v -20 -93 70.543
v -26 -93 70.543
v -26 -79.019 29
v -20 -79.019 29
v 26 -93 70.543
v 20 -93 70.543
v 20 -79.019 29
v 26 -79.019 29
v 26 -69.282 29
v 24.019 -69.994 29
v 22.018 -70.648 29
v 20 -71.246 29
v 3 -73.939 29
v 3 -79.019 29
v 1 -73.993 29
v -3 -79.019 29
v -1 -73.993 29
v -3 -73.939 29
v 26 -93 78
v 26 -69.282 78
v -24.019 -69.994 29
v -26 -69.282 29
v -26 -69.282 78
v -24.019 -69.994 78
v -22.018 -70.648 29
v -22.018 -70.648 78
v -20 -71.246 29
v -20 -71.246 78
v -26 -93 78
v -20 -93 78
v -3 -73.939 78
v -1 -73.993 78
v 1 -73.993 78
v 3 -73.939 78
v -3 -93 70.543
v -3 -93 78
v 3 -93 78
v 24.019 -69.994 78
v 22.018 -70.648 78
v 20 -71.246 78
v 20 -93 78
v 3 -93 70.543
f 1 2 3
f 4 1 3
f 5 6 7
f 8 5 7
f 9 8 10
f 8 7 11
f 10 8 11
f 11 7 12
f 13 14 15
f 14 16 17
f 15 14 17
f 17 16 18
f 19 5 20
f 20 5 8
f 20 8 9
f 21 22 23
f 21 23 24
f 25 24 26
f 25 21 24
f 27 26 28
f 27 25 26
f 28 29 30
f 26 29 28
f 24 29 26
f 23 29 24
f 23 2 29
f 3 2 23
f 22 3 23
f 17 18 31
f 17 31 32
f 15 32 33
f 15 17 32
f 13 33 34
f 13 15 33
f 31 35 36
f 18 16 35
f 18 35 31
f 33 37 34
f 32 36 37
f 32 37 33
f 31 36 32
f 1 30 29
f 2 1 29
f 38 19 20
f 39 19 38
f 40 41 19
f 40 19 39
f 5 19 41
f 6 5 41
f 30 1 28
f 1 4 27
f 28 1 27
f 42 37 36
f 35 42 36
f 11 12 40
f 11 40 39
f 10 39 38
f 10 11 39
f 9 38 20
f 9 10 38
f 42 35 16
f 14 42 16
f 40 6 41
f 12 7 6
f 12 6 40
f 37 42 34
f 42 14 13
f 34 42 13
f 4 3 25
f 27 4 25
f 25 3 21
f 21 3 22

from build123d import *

# Parameters (mm, degrees)
CYLINDER1827_R         = 74
CYLINDER1827_DEPTH     = 64
BOX790_W               = 80
BOX790_H               = 6
BOX790_DEPTH           = 20
BOX790_PLACEMENT_ANGLE = 71.4
BOX792_W               = 44
BOX792_H               = 6
BOX792_DEPTH           = 49
CUT588_PLACEMENT_ANGLE = 90
BOX795_W               = 80
BOX795_H               = 6
BOX795_DEPTH           = 20
BOX795_PLACEMENT_ANGLE = 71.4
BOX796_W               = 44
BOX796_H               = 6
BOX796_DEPTH           = 49
CUT590_PLACEMENT_ANGLE = 90
BOX789_W               = 80
BOX789_H               = 6
BOX789_DEPTH           = 20
BOX789_PLACEMENT_ANGLE = 71.4
BOX787_W               = 44
BOX787_H               = 6
BOX787_DEPTH           = 49
CUT587_PLACEMENT_ANGLE = 90


with BuildPart() as v_lec1827:
    # Cylinder1827 → Cylinder1827 (new body)
    with BuildSketch(Plane.XY.offset(25)):
        Circle(CYLINDER1827_R)
    extrude(amount=CYLINDER1827_DEPTH)


with BuildPart() as krychle790:
    # Box790 → Box790 (new body)
    with BuildSketch(Plane.XY):
        with Locations((40, 3)):
            Rectangle(BOX790_W, BOX790_H)
    extrude(amount=BOX790_DEPTH)


with BuildPart() as krychle790_1:
    # Box790 placement: moved
    add(krychle790.part.moved(Location((-118.17, -24, 82.63))).rotate(Axis((-118.17, -24, 82.63), (0, 1, 0)), BOX790_PLACEMENT_ANGLE))


with BuildPart() as cut588:
    # Box792 → Box792 (new body)
    with BuildSketch(Plane(origin=(-93, -24, 29), x_dir=(1, 0, 0), z_dir=(0, 0, 1))):
        with Locations((22, 3)):
            Rectangle(BOX792_W, BOX792_H)
    extrude(amount=BOX792_DEPTH)

    # Cut588: cut Krychle790
    add(krychle790_1.part, mode=Mode.SUBTRACT)


with BuildPart() as cut588_1:
    # Cut588 placement: moved
    add(cut588.part.moved(Location((-44, 0, 0))).rotate(Axis((-44, 0, 0), (0, 0, 1)), CUT588_PLACEMENT_ANGLE))


with BuildPart() as krychle795:
    # Box795 → Box795 (new body)
    with BuildSketch(Plane.XY):
        with Locations((40, 3)):
            Rectangle(BOX795_W, BOX795_H)
    extrude(amount=BOX795_DEPTH)


with BuildPart() as krychle795_1:
    # Box795 placement: moved
    add(krychle795.part.moved(Location((-118.17, -24, 82.63))).rotate(Axis((-118.17, -24, 82.63), (0, 1, 0)), BOX795_PLACEMENT_ANGLE))


with BuildPart() as cut590:
    # Box796 → Box796 (new body)
    with BuildSketch(Plane(origin=(-93, -24, 29), x_dir=(1, 0, 0), z_dir=(0, 0, 1))):
        with Locations((22, 3)):
            Rectangle(BOX796_W, BOX796_H)
    extrude(amount=BOX796_DEPTH)

    # Cut590: cut Krychle795
    add(krychle795_1.part, mode=Mode.SUBTRACT)


with BuildPart() as cut590_1:
    # Cut590 placement: moved
    add(cut590.part.moved(Location((-21, 0, 0))).rotate(Axis((-21, 0, 0), (0, 0, 1)), CUT590_PLACEMENT_ANGLE))


with BuildPart() as krychle789:
    # Box789 → Box789 (new body)
    with BuildSketch(Plane.XY):
        with Locations((40, 3)):
            Rectangle(BOX789_W, BOX789_H)
    extrude(amount=BOX789_DEPTH)


with BuildPart() as krychle789_1:
    # Box789 placement: moved
    add(krychle789.part.moved(Location((-118.17, -24, 82.63))).rotate(Axis((-118.17, -24, 82.63), (0, 1, 0)), BOX789_PLACEMENT_ANGLE))


with BuildPart() as cut593:
    # Box787 → Box787 (new body)
    with BuildSketch(Plane(origin=(-93, -24, 29), x_dir=(1, 0, 0), z_dir=(0, 0, 1))):
        with Locations((22, 3)):
            Rectangle(BOX787_W, BOX787_H)
    extrude(amount=BOX787_DEPTH)

    # Cut587: cut Krychle789
    add(krychle789_1.part, mode=Mode.SUBTRACT)


with BuildPart() as cut593_1:
    # Cut587 placement: moved
    add(cut593.part.moved(Location((2, 0, 0))).rotate(Axis((2, 0, 0), (0, 0, 1)), CUT587_PLACEMENT_ANGLE))

    # Compound929: union Cut588, Cut590
    add(cut588_1.part)
    add(cut590_1.part)

    # Cut593: cut Válec1827
    add(v_lec1827.part, mode=Mode.SUBTRACT)


solid = cut593_1.part
